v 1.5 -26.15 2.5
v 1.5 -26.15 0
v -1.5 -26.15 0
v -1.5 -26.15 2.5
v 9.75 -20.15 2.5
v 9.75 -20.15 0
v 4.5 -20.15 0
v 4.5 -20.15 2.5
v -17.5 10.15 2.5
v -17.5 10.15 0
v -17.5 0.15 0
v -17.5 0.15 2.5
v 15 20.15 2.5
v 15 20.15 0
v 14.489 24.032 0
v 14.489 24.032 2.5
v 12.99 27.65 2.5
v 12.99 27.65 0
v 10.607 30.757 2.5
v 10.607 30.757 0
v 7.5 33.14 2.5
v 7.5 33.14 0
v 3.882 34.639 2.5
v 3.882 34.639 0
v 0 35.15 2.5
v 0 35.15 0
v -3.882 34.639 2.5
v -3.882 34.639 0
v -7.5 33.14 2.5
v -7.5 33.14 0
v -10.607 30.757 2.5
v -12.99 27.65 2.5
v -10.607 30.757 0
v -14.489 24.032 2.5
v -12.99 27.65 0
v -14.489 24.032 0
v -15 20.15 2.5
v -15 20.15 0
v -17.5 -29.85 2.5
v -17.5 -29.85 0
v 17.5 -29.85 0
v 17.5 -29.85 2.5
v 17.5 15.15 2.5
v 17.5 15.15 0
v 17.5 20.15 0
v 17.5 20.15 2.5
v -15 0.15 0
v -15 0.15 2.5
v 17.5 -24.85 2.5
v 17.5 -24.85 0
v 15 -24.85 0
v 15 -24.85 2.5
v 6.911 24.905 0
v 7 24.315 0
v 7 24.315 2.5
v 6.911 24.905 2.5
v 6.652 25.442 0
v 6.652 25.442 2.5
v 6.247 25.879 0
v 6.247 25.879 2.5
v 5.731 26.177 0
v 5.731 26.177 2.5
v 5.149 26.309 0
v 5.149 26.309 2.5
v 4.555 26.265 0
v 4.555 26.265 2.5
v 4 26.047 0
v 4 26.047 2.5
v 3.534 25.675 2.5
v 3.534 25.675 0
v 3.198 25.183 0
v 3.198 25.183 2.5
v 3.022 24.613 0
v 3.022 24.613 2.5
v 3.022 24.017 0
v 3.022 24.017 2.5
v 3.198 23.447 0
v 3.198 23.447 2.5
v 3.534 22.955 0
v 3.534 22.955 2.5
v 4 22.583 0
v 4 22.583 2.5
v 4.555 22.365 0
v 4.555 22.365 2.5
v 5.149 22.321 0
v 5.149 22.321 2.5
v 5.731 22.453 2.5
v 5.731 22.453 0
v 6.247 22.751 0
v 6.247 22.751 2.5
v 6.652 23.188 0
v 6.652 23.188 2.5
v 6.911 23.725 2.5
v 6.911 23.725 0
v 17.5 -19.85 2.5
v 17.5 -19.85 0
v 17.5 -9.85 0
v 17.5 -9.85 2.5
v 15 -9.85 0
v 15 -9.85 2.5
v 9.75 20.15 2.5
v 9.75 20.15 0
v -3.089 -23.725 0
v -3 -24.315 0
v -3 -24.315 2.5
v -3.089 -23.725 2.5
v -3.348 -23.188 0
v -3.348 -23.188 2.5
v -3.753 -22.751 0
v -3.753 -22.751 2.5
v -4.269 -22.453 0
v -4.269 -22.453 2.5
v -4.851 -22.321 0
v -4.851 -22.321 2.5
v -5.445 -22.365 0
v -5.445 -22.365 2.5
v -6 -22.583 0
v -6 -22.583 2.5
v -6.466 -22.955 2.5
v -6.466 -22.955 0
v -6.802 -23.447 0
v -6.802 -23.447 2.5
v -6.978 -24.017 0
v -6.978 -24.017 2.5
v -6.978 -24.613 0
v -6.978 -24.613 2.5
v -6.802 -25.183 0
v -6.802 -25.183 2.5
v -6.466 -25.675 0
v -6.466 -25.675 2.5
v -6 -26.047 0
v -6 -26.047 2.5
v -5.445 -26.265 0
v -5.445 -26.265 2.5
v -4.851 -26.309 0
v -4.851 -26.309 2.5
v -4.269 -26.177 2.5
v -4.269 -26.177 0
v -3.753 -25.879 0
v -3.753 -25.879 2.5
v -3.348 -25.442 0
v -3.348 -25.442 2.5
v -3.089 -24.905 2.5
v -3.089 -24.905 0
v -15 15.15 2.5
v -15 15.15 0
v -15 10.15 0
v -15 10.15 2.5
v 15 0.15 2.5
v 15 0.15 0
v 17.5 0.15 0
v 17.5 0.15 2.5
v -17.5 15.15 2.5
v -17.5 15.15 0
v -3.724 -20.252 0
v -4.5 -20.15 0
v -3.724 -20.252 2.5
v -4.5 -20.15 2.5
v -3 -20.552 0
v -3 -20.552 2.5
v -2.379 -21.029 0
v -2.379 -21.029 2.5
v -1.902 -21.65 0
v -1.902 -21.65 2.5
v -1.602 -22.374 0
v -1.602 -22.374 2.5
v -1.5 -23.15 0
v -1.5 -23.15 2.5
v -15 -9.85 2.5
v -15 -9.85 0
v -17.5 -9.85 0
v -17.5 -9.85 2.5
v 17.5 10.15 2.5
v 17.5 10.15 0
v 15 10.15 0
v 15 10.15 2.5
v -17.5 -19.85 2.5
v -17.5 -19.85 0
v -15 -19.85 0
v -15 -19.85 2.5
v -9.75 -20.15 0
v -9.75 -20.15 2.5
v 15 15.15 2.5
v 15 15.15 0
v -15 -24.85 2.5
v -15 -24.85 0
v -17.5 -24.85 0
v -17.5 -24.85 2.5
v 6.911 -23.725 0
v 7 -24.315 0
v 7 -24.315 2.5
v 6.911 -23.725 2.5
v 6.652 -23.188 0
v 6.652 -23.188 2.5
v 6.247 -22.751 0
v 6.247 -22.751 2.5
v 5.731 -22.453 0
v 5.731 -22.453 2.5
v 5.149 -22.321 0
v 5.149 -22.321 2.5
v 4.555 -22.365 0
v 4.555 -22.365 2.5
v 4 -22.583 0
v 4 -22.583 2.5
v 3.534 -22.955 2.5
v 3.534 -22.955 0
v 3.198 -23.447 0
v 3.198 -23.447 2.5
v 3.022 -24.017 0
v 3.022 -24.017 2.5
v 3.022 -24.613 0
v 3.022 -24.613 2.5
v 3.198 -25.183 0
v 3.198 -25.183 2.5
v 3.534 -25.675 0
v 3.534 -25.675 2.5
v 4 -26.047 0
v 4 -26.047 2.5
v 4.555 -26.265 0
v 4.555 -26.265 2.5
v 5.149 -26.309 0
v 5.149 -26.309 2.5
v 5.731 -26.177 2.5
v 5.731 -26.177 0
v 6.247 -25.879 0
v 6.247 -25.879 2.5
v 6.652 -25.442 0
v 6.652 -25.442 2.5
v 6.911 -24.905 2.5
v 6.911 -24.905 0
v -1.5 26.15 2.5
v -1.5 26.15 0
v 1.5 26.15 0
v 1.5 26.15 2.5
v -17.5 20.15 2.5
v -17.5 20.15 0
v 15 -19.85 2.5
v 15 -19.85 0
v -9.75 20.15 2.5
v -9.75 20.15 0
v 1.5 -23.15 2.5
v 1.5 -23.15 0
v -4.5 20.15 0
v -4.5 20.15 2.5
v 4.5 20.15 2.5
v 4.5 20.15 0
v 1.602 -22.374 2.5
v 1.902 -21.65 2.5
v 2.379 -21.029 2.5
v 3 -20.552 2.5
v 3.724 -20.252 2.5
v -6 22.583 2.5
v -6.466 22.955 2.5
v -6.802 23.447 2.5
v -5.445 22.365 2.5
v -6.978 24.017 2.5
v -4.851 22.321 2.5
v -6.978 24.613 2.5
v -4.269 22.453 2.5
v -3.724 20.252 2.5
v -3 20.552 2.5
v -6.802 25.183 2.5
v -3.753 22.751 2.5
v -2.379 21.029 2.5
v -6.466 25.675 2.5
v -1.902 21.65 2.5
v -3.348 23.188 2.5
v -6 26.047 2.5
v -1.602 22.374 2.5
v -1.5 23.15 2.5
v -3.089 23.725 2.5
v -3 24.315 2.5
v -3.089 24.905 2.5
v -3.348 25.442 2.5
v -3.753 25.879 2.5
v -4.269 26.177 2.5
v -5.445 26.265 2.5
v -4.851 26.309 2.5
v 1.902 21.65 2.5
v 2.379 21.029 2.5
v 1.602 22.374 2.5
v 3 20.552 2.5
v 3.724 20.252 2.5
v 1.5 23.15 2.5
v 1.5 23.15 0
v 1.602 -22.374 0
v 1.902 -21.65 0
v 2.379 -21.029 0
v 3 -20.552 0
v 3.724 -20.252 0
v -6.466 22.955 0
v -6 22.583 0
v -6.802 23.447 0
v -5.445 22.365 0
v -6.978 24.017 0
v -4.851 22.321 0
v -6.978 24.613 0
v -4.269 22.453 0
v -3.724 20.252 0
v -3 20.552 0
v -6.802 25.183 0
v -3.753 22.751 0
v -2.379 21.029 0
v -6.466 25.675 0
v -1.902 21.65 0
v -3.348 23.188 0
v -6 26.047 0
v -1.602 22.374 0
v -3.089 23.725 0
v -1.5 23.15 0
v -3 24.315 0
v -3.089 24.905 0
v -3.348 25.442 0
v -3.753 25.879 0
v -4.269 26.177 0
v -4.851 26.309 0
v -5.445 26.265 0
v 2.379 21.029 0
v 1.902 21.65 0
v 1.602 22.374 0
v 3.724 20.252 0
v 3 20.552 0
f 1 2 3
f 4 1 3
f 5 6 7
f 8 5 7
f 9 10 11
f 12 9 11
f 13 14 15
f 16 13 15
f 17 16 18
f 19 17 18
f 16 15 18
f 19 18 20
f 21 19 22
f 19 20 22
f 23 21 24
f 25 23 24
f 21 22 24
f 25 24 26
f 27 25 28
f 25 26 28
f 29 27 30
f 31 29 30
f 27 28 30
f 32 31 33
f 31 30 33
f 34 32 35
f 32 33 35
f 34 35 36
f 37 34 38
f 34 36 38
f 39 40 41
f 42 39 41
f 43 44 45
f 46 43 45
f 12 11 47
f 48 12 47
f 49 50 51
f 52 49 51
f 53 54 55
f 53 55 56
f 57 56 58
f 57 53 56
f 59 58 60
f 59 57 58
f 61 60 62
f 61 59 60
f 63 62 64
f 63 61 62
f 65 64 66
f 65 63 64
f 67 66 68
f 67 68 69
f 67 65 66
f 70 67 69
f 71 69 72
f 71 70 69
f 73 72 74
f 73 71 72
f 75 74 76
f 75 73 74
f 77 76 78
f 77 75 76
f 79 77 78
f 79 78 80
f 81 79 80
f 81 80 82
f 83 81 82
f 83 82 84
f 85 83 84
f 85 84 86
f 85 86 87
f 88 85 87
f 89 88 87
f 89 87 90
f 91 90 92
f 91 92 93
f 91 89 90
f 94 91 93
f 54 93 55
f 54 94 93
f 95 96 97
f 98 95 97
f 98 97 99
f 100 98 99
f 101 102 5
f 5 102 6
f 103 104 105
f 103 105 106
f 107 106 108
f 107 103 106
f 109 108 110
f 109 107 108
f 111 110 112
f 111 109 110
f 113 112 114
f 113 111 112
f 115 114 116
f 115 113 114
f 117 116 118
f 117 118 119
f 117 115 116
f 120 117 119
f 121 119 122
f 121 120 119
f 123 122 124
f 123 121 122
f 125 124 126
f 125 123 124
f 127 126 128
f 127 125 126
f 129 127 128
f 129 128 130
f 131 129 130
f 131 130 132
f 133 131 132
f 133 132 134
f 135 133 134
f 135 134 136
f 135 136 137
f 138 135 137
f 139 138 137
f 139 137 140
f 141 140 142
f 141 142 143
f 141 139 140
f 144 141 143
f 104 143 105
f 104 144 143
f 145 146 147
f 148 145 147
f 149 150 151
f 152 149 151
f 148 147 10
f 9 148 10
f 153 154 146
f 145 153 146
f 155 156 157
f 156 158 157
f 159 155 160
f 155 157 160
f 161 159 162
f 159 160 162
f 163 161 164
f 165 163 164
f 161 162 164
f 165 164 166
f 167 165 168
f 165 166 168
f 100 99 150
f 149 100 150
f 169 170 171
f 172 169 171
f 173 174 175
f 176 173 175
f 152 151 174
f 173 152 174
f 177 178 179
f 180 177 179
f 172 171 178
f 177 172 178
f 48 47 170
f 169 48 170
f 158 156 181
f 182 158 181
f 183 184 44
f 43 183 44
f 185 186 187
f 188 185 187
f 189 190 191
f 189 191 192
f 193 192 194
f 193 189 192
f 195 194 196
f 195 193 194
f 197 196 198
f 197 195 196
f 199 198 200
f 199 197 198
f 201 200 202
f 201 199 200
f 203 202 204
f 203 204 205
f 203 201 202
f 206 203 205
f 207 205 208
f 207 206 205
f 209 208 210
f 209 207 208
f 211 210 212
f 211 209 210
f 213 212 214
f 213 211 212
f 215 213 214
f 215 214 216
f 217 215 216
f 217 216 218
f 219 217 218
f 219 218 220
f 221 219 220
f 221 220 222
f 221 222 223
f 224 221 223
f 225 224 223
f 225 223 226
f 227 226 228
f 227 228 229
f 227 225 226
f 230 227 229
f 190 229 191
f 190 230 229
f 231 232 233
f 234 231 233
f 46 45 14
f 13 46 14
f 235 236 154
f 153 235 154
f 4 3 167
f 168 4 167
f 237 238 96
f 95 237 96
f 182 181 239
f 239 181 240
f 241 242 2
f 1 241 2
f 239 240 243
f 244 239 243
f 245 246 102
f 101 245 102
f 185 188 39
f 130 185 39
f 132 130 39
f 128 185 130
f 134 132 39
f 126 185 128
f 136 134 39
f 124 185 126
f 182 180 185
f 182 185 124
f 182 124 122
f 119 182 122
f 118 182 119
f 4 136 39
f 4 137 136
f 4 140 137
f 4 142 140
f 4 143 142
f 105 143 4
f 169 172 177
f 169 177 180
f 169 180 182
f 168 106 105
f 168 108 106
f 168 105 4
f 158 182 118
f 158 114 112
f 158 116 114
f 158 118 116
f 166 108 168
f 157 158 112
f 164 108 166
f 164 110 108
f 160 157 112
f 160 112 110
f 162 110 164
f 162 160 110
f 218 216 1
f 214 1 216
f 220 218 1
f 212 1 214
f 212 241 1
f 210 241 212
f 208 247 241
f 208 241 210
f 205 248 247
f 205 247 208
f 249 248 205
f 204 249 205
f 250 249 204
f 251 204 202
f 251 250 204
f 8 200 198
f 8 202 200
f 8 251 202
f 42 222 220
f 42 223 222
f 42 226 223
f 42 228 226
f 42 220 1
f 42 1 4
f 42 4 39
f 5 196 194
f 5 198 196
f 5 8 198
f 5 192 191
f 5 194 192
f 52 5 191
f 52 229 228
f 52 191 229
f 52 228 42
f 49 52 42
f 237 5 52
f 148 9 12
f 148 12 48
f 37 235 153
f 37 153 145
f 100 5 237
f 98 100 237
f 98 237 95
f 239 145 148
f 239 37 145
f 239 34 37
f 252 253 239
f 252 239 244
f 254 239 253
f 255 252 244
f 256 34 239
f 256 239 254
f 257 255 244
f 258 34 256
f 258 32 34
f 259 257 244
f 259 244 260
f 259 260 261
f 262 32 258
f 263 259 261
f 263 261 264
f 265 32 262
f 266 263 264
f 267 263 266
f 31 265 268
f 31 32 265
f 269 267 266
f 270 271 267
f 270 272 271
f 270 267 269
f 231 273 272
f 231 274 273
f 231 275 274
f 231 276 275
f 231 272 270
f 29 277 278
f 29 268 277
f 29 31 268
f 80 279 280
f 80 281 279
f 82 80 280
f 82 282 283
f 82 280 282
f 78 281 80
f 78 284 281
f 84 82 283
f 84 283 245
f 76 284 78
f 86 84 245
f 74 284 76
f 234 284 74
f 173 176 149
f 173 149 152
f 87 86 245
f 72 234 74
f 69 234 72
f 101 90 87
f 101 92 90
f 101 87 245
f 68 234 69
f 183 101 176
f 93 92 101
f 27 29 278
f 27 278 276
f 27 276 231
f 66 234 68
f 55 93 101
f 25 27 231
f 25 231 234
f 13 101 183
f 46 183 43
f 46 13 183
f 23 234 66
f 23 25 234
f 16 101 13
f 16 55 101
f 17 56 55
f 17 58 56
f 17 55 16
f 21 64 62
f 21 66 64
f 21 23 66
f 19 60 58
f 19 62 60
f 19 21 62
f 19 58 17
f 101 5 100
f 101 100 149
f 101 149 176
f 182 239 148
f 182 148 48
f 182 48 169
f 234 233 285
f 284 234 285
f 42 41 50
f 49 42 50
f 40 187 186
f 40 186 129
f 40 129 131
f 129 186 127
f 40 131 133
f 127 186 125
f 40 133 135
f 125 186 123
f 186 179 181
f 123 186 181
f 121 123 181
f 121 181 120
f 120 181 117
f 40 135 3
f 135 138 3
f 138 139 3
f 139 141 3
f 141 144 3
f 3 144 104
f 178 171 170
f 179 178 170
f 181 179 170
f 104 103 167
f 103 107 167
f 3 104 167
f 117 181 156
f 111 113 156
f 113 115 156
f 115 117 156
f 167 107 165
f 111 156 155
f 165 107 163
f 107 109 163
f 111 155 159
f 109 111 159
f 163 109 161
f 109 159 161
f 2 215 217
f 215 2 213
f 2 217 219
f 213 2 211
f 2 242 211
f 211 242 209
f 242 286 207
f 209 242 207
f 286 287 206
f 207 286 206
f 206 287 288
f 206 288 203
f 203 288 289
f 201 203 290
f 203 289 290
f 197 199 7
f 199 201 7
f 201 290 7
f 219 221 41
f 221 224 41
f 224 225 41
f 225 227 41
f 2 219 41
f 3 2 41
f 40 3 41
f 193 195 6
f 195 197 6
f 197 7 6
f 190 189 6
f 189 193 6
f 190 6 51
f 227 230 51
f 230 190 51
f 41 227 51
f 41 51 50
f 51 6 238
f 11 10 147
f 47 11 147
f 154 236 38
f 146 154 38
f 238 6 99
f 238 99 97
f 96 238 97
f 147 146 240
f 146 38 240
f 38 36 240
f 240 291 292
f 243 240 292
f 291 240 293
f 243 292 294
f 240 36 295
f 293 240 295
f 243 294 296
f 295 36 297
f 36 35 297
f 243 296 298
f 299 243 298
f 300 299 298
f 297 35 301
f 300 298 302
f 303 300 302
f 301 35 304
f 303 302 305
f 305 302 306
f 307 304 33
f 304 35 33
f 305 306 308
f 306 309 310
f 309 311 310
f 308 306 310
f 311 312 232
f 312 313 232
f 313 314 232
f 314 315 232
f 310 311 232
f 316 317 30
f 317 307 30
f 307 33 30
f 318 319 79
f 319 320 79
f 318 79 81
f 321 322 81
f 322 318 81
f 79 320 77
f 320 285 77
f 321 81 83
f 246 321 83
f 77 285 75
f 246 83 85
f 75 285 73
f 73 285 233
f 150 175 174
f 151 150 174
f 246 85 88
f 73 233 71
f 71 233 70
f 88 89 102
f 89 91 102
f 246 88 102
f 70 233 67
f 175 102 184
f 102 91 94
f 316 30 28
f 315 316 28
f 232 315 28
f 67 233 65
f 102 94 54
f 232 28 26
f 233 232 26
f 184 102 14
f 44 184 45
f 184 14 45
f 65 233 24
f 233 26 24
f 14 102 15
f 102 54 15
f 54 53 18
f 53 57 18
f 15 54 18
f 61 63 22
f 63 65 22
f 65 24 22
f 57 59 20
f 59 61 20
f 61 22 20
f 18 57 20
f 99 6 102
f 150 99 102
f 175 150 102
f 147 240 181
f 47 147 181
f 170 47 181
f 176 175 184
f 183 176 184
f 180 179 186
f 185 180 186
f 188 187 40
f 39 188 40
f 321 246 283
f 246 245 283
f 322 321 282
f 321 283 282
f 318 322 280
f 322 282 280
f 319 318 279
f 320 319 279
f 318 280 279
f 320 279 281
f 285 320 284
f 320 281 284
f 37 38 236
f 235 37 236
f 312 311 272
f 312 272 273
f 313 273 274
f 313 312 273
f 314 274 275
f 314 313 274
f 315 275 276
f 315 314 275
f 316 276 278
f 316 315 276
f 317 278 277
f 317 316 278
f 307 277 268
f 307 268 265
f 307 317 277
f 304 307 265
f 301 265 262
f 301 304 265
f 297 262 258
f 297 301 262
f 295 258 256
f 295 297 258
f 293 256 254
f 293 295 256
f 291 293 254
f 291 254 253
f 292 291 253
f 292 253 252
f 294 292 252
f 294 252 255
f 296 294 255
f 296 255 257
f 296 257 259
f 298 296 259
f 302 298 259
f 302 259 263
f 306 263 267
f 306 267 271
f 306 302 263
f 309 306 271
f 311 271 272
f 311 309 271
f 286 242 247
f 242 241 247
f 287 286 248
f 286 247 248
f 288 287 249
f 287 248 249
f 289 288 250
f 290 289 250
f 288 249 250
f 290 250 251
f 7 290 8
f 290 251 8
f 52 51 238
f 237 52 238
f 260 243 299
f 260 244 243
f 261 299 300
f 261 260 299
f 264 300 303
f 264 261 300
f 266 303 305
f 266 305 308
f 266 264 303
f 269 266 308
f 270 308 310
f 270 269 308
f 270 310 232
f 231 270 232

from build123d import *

# Parameters (mm, degrees)
CROQUIS1_R              = 2
SALIENTE_EXTRUIR1_DEPTH = 2.5
REDONDEO6_R             = 3
REDONDEO7_R             = 3
REDONDEO8_R             = 3


with BuildPart() as part:
    # Croquis1 → Saliente-Extruir1 (new body)
    with BuildSketch(Plane.XY):
        with BuildLine():
            Line((-15, 20.15), (-17.5, 20.15))
            Line((-17.5, 20.15), (-17.5, 15.15))
            Line((-17.5, 15.15), (-15, 15.15))
            Line((-15, 15.15), (-15, 10.15))
            Line((-15, 10.15), (-17.5, 10.15))
            Line((-17.5, 10.15), (-17.5, 0.15))
            Line((-17.5, 0.15), (-15, 0.15))
            Line((-15, 0.15), (-15, -9.85))
            Line((-15, -9.85), (-17.5, -9.85))
            Line((-17.5, -9.85), (-17.5, -19.85))
            Line((-17.5, -19.85), (-15, -19.85))
            Line((-15, -19.85), (-15, -24.85))
            Line((-15, -24.85), (-17.5, -24.85))
            Line((-17.5, -24.85), (-17.5, -29.85))
            Line((-17.5, -29.85), (-15, -29.85))
            Line((-15, -29.85), (15, -29.85))
            Line((15, -29.85), (17.5, -29.85))
            Line((17.5, -29.85), (17.5, -24.85))
            Line((17.5, -24.85), (15, -24.85))
            Line((15, -24.85), (15, -19.85))
            Line((15, -19.85), (17.5, -19.85))
            Line((17.5, -19.85), (17.5, -9.85))
            Line((17.5, -9.85), (15, -9.85))
            Line((15, -9.85), (15, 0.15))
            Line((15, 0.15), (17.5, 0.15))
            Line((17.5, 0.15), (17.5, 10.15))
            Line((17.5, 10.15), (15, 10.15))
            Line((15, 10.15), (15, 15.15))
            Line((15, 15.15), (17.5, 15.15))
            Line((17.5, 15.15), (17.5, 20.15))
            Line((17.5, 20.15), (15, 20.15))
            ThreePointArc((15, 20.15), (0, 35.15), (-15, 20.15))
        make_face()
        with Locations((-5, 24.315)):
            Circle(CROQUIS1_R, mode=Mode.SUBTRACT)
        with Locations((5, 24.315)):
            Circle(CROQUIS1_R, mode=Mode.SUBTRACT)
        with Locations((-5, -24.315)):
            Circle(CROQUIS1_R, mode=Mode.SUBTRACT)
        with Locations((5, -24.315)):
            Circle(CROQUIS1_R, mode=Mode.SUBTRACT)
        Polygon((-9.75, 20.15), (-1.5, 20.15), (-1.5, 26.15), (1.5, 26.15), (1.5, 20.15), (9.75, 20.15), (9.75, -20.15), (1.5, -20.15), (1.5, -26.15), (-1.5, -26.15), (-1.5, -20.15), (-9.75, -20.15), align=None, mode=Mode.SUBTRACT)
    extrude(amount=SALIENTE_EXTRUIR1_DEPTH)

    # Redondeo6
    redondeo6_edges = [part.edges().sort_by_distance(p)[0] for p in [
        (-1.5, -20.15, 1.25),
    ]]
    fillet(redondeo6_edges, radius=REDONDEO6_R)

    # Redondeo7
    redondeo7_edges = [part.edges().sort_by_distance(p)[0] for p in [
        (1.5, -20.15, 1.25),
    ]]
    fillet(redondeo7_edges, radius=REDONDEO7_R)

    # Redondeo8
    redondeo8_edges = [part.edges().sort_by_distance(p)[0] for p in [
        (1.5, 20.15, 1.25),
        (-1.5, 20.15, 1.25),
    ]]
    fillet(redondeo8_edges, radius=REDONDEO8_R)


solid = part.part
